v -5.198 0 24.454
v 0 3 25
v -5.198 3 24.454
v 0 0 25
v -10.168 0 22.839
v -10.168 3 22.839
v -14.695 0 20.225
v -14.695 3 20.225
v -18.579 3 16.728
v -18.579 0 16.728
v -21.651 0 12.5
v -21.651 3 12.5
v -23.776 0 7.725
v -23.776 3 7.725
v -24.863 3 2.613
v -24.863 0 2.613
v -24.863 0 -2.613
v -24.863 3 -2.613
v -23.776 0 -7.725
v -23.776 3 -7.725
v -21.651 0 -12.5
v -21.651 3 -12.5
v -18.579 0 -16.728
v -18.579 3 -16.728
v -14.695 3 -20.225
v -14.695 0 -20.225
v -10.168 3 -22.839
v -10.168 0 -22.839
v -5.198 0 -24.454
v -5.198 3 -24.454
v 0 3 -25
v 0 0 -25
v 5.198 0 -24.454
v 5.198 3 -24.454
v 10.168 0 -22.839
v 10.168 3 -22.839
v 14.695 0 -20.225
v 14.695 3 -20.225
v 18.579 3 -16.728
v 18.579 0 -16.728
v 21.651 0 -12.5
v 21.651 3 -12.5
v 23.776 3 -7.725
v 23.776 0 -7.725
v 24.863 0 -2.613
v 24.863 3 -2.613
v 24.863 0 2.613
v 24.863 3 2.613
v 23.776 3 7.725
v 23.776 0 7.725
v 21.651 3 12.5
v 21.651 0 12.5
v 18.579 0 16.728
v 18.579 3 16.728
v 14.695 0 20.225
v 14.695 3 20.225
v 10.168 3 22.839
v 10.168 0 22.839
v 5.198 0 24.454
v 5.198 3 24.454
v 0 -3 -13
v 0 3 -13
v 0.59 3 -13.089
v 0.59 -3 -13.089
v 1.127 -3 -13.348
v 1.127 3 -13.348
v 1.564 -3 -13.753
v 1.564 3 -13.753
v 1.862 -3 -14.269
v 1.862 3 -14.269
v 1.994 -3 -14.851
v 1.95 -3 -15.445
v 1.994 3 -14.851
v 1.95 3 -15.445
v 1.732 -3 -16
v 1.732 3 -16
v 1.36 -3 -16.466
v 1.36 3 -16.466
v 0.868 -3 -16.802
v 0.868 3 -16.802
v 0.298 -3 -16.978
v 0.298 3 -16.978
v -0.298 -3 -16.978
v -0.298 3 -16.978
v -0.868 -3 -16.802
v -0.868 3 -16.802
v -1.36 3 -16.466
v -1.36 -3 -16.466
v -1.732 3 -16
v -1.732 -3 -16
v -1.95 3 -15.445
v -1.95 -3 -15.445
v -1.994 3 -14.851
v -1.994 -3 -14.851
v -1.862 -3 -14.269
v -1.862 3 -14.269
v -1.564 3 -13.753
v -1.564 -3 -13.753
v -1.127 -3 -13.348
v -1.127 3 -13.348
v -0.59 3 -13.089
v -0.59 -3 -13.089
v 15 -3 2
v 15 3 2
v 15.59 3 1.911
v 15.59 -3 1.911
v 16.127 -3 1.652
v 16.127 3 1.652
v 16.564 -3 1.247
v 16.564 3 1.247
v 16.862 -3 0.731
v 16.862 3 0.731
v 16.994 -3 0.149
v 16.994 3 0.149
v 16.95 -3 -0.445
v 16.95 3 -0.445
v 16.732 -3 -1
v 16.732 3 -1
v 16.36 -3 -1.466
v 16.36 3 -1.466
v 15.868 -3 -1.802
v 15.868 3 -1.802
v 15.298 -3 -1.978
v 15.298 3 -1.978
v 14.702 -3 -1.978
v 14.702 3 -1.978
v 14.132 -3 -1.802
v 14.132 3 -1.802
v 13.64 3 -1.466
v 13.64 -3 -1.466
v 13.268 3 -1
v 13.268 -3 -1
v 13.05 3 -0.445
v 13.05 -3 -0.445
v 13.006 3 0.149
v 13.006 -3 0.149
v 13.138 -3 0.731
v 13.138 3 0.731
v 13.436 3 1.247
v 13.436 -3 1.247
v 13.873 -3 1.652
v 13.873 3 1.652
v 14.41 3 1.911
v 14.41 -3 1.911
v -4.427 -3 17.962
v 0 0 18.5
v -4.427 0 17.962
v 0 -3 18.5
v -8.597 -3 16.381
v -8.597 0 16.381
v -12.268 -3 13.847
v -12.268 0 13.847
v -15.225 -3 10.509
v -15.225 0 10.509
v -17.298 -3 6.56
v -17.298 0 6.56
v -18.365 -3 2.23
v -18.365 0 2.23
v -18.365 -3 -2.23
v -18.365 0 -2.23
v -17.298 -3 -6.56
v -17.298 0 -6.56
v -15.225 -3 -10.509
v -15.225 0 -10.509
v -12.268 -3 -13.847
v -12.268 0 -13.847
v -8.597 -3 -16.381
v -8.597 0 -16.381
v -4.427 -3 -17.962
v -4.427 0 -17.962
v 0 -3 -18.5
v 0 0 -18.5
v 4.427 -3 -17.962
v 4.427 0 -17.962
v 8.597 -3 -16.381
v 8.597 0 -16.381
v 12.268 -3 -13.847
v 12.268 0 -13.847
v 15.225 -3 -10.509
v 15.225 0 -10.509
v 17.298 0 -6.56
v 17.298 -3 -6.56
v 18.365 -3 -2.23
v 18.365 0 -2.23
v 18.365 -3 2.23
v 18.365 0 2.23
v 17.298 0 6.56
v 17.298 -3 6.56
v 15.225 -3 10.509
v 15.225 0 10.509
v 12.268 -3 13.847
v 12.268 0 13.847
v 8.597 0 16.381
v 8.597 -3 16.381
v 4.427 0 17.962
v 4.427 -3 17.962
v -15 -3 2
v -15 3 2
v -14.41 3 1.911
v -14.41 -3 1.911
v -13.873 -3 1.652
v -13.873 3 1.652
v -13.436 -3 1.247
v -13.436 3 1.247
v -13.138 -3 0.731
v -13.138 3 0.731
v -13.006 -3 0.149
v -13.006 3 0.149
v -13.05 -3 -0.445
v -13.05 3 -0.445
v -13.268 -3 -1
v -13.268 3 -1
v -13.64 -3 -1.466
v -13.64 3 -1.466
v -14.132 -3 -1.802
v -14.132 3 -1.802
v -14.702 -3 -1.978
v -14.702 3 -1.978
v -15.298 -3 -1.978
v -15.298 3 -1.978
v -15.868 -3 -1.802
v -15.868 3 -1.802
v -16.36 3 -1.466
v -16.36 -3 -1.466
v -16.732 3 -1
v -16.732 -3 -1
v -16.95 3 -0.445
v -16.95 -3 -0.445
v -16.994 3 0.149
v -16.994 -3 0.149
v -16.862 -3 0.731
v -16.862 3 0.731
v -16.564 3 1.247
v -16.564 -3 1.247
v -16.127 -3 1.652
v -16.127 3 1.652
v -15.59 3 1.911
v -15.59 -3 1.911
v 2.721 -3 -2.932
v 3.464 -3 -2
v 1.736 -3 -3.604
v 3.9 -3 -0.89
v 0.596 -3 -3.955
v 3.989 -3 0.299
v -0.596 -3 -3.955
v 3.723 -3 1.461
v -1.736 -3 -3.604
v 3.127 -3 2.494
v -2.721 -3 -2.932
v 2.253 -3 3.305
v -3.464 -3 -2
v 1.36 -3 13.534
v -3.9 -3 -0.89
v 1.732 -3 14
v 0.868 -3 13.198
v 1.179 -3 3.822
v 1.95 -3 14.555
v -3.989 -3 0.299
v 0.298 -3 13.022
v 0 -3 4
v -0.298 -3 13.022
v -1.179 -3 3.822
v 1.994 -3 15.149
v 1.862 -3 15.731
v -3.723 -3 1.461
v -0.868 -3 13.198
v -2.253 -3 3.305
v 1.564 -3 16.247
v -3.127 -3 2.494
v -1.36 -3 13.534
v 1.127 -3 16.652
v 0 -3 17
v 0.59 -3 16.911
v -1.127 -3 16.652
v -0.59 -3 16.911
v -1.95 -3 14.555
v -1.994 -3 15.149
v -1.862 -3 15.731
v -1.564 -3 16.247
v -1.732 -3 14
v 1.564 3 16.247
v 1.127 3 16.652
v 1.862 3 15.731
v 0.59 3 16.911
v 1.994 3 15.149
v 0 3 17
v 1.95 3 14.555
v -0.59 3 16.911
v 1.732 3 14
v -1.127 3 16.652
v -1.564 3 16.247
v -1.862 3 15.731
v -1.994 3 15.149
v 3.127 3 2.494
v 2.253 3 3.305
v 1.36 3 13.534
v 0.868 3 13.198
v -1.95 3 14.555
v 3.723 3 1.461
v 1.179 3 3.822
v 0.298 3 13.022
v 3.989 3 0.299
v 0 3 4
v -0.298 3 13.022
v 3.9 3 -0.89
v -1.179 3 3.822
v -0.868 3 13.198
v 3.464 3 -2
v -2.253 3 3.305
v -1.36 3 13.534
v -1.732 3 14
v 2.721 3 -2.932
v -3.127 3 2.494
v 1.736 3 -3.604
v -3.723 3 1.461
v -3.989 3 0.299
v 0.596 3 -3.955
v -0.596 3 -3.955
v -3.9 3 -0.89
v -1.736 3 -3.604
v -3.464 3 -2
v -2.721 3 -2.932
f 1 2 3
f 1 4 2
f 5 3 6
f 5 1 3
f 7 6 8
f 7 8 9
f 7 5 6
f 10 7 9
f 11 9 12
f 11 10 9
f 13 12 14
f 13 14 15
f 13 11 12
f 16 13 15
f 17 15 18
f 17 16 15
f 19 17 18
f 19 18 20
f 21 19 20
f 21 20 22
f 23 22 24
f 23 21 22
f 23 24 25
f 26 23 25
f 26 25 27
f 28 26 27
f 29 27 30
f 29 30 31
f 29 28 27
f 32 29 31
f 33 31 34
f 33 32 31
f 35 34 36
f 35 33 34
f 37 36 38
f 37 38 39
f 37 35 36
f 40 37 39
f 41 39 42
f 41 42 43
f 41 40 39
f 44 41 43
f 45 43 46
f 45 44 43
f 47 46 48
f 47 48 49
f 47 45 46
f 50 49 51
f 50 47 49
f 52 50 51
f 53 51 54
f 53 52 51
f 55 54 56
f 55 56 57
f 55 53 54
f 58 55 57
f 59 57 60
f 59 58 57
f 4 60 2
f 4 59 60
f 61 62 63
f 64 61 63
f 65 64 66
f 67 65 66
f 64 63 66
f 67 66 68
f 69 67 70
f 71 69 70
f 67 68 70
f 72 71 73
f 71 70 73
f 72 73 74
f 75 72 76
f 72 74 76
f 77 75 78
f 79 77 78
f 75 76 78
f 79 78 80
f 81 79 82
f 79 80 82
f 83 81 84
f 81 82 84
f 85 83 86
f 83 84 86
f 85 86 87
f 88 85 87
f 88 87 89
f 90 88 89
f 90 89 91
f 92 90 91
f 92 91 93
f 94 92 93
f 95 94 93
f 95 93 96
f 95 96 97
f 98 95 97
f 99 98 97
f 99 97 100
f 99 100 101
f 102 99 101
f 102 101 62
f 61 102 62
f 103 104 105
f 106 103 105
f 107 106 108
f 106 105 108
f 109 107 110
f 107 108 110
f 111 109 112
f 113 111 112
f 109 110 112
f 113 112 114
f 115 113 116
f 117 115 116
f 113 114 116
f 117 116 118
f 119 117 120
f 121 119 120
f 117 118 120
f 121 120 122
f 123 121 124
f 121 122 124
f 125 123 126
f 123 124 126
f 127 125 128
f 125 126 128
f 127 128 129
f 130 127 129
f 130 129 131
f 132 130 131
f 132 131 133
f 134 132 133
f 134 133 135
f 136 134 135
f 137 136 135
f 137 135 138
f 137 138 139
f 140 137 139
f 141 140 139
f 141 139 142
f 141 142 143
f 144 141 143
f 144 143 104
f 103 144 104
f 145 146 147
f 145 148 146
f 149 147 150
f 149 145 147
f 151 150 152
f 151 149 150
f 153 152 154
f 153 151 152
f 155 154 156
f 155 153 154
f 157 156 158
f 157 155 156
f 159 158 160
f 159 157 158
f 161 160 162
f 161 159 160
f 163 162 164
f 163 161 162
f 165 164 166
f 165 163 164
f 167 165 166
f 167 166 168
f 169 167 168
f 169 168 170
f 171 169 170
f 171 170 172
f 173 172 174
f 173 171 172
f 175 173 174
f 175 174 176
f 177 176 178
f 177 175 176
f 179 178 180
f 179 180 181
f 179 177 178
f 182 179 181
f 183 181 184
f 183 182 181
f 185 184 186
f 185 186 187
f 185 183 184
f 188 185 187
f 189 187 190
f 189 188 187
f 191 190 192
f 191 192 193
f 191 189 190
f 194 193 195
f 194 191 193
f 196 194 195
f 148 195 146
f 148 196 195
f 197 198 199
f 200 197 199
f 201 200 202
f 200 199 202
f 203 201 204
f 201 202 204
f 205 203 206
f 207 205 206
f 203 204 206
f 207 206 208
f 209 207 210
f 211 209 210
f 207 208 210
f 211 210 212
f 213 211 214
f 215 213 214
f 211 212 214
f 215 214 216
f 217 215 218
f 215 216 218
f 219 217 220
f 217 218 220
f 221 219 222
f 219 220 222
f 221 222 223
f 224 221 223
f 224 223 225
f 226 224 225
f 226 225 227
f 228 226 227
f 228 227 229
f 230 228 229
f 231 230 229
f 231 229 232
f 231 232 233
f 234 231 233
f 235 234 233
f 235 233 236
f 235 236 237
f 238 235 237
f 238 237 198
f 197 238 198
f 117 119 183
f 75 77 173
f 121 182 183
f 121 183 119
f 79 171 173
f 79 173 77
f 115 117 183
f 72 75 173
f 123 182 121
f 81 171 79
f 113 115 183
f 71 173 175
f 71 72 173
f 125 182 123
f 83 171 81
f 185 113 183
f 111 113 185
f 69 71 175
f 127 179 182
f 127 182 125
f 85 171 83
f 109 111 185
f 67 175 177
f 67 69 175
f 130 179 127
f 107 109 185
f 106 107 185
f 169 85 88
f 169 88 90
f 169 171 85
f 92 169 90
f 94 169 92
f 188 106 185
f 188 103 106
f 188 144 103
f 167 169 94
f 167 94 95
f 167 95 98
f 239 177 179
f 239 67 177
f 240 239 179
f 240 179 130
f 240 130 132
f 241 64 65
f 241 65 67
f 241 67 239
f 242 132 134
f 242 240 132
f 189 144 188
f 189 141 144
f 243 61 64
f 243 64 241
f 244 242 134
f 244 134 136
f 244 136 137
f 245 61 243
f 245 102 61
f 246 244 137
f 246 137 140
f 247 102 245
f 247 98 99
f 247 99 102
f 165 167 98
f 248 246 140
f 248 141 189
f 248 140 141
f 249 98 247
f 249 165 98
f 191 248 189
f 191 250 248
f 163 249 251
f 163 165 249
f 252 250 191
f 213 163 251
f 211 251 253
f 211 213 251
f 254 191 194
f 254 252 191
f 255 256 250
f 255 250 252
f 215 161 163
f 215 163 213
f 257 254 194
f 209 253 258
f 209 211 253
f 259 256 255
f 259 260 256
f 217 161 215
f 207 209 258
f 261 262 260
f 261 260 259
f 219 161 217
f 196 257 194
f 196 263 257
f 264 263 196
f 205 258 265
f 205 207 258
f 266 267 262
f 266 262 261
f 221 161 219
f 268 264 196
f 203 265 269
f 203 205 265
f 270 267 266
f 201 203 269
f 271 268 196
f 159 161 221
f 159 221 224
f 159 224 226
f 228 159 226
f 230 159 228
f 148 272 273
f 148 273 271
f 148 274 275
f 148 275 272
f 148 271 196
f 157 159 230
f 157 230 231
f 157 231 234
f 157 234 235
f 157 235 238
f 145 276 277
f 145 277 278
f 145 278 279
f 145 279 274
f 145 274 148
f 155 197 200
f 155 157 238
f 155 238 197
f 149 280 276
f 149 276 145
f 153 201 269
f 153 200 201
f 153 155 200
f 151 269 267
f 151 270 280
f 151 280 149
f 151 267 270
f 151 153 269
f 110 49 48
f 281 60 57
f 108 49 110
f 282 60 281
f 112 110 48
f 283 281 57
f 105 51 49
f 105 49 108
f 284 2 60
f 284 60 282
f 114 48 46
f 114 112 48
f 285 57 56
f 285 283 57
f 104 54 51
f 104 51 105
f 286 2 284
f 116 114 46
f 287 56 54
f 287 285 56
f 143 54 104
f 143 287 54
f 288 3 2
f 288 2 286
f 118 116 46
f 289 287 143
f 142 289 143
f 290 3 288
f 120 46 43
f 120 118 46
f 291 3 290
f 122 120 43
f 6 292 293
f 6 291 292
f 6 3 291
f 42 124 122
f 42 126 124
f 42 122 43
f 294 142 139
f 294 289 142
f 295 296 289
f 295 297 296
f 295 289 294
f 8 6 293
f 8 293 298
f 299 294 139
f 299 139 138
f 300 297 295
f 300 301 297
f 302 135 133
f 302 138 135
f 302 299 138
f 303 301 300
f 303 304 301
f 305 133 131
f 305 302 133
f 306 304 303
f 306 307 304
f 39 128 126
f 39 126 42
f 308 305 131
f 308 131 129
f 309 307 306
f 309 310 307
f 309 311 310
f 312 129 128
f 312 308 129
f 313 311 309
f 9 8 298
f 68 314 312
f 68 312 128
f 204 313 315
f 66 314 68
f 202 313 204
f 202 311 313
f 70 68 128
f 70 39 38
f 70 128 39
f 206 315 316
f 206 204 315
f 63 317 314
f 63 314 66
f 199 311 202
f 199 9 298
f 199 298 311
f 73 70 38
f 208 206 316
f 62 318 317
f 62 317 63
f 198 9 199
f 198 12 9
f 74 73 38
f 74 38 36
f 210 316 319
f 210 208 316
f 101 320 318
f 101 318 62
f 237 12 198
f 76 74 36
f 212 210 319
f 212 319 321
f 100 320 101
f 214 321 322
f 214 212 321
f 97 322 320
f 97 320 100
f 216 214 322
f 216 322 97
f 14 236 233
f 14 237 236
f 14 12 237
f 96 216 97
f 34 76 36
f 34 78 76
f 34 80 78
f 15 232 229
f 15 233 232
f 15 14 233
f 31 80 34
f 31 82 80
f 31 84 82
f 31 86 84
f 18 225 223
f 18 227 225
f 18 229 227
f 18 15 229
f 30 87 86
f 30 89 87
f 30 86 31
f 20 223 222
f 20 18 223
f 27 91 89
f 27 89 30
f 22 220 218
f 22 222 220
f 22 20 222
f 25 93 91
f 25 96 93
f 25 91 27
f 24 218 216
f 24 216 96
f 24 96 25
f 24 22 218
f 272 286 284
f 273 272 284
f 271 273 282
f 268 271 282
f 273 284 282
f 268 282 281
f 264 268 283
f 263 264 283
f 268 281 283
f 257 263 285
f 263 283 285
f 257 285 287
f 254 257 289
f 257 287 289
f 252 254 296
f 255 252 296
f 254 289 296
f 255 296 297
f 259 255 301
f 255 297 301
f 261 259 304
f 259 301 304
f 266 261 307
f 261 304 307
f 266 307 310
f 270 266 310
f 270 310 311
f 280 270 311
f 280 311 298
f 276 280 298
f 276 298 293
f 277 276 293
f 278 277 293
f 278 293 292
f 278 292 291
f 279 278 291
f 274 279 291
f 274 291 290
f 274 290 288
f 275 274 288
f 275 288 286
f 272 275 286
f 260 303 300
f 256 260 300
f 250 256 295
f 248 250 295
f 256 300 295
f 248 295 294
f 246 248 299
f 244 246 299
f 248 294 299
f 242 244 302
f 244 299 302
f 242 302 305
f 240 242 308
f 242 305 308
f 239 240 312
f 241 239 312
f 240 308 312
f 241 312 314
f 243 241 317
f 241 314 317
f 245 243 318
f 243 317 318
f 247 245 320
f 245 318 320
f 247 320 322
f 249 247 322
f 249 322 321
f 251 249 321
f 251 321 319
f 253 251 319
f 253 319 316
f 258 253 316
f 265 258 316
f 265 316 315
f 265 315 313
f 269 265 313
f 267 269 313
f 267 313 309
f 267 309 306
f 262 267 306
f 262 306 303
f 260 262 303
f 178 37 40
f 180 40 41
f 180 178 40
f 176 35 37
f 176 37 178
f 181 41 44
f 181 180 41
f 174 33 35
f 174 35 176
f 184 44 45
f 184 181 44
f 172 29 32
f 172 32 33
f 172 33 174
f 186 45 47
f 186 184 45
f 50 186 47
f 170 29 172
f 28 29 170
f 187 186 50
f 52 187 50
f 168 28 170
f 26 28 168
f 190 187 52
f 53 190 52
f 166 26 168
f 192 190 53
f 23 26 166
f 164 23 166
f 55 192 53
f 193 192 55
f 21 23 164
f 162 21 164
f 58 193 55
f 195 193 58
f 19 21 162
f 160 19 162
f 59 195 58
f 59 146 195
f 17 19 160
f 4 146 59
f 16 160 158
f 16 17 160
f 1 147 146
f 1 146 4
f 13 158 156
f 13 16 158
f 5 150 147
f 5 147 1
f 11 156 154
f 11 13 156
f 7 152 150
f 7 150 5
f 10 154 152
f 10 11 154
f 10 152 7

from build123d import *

# Parameters (mm, degrees)
SKETCH_2_R          = 2
SKETCH_2_R_2        = 4
CUT_EXTRUDE_1_DEPTH = 36.860842154


with BuildPart() as part:
    # 草图1 → 旋转1 (revolve)
    with BuildSketch(Plane.XY, mode=Mode.PRIVATE) as revolve_1_sk:
        Polygon((0, 3), (-25, 3), (-25, 0), (-18.5, 0), (-18.5, -3), (0, -3), align=None)
    revolve(revolve_1_sk.sketch.rotate(Axis((0, 11.295290754, 0), (0, -1, 0)), 270), axis=Axis((0, 11.295290754, 0), (0, -1, 0)))

    # 草图2 → 切除-拉伸1 (cut, through all)
    with BuildSketch(Plane(origin=(0, 3, 0), x_dir=(1, 0, 0), z_dir=(0, 1, 0))):
        with Locations(Location((0, 15, 0), (0, 0, 270))):
            Circle(SKETCH_2_R)
        with Locations(Location((15, 0, 0), (0, 0, 270))):
            Circle(SKETCH_2_R)
        with Locations(Location((0, -15, 0), (0, 0, 270))):
            Circle(SKETCH_2_R)
        with Locations(Location((-15, 0, 0), (0, 0, 270))):
            Circle(SKETCH_2_R)
        with Locations(Location((0, 0, 0), (0, 0, 270))):
            Circle(SKETCH_2_R_2)
    extrude(amount=-CUT_EXTRUDE_1_DEPTH, mode=Mode.SUBTRACT)


solid = part.part
